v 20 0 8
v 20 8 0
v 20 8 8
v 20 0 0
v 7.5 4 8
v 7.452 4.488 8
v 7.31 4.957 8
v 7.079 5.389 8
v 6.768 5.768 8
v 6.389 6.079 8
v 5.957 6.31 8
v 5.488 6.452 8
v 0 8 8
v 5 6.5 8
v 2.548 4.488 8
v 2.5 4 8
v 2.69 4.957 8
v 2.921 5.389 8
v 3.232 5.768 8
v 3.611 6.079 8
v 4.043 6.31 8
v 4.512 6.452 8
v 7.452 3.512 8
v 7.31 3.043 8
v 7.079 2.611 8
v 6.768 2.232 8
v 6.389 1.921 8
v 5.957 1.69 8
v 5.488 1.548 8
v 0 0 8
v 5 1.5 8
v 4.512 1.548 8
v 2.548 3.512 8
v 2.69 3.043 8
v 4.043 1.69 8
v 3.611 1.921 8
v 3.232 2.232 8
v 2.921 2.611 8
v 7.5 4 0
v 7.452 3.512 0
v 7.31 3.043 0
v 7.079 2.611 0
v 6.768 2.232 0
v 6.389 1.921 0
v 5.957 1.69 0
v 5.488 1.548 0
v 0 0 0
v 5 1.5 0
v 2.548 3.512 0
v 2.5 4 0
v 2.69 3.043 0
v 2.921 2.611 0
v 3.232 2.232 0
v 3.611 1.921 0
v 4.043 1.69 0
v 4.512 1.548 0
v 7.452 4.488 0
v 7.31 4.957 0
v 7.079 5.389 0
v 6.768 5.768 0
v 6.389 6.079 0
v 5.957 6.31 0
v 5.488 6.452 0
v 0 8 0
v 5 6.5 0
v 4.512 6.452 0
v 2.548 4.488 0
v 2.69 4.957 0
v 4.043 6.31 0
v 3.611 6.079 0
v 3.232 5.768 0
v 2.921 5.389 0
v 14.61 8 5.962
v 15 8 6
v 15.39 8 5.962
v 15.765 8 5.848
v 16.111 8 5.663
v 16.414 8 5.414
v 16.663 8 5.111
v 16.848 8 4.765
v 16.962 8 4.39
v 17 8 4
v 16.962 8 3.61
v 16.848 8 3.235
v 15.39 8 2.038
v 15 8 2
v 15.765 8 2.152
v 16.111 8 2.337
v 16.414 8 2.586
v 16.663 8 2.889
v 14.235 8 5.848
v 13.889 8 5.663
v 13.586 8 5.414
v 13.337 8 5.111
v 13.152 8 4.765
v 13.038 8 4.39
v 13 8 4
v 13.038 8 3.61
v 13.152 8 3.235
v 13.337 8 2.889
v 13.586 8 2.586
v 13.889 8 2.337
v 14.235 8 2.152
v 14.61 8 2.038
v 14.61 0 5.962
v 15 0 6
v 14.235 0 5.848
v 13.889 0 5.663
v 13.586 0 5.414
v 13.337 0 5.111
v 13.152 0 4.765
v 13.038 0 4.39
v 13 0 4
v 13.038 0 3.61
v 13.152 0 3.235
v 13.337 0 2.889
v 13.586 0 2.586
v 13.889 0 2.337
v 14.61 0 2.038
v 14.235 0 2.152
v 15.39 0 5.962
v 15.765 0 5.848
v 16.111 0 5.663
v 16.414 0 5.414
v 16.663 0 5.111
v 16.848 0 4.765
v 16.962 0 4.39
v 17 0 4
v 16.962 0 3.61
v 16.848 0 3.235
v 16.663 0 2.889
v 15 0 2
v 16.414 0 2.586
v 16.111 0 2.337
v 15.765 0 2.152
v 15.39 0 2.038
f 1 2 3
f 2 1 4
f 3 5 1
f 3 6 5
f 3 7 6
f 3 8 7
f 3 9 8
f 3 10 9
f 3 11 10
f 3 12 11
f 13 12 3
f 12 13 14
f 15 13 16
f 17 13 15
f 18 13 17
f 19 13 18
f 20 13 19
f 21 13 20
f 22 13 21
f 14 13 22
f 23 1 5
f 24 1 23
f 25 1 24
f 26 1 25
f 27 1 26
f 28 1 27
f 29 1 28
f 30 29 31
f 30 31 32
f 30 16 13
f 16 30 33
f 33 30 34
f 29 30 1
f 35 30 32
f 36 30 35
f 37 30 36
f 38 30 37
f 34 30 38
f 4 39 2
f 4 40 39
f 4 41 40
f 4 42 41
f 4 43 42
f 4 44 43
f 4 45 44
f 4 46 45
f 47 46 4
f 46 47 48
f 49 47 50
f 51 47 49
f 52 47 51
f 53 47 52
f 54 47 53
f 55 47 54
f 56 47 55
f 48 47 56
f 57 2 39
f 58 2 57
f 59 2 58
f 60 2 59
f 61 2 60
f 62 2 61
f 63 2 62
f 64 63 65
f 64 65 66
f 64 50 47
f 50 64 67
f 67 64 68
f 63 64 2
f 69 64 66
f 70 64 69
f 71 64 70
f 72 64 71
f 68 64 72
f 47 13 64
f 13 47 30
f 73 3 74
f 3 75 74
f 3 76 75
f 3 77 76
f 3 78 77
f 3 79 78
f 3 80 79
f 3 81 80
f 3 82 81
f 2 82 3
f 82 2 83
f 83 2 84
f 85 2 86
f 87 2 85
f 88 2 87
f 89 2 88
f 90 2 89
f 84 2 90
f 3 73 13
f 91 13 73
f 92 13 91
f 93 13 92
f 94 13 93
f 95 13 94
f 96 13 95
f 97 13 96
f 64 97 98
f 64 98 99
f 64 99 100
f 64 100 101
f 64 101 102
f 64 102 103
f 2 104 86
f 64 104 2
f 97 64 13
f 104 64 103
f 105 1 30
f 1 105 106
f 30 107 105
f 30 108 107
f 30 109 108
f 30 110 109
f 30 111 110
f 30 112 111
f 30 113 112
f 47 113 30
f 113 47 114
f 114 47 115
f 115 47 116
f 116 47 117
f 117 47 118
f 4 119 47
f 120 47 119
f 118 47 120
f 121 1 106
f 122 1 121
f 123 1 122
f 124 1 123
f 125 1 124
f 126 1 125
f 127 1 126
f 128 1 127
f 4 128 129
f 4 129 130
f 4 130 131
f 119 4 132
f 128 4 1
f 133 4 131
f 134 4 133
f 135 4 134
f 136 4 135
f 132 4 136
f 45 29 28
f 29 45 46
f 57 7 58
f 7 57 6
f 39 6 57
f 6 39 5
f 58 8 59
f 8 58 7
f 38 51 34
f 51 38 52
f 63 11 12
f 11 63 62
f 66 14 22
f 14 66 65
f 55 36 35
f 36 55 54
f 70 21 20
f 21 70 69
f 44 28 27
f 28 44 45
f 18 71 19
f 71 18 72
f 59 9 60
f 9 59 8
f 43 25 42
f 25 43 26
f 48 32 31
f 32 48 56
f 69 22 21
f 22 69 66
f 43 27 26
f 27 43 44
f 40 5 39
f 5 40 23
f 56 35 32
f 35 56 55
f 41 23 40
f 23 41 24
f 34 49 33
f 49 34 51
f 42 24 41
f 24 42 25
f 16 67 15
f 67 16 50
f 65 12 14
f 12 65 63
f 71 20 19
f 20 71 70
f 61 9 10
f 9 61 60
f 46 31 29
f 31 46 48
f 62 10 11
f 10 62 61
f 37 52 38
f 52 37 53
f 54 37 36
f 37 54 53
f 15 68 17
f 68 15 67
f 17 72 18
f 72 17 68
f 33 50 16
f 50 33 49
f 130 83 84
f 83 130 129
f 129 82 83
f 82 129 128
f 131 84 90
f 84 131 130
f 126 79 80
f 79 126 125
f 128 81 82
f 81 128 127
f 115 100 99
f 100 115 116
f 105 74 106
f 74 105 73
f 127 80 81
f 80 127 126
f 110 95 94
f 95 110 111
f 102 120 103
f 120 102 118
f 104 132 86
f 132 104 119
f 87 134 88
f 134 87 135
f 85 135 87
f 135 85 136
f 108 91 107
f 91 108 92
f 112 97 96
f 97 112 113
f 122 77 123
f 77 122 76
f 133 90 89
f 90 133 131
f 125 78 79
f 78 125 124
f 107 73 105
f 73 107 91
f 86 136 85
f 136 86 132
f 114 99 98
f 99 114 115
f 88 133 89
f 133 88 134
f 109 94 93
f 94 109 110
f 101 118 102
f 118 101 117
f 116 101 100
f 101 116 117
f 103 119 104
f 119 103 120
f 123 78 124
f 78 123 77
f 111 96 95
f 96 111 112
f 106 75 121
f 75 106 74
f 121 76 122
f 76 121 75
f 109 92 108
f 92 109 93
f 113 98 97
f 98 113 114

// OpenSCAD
// just test output
$fn = 32;


h_0 = 8.0;

difference() {
  cube( [20.0,8.0,8.0] );
  translate( [    5.0,h_0/2,0.0]) cylinder( r=2.5, h=h_0 );
  #translate( [   15.0,0.0,h_0/2]) rotate([-90,0,0]) cylinder( r=2.0, h=h_0 );
}
